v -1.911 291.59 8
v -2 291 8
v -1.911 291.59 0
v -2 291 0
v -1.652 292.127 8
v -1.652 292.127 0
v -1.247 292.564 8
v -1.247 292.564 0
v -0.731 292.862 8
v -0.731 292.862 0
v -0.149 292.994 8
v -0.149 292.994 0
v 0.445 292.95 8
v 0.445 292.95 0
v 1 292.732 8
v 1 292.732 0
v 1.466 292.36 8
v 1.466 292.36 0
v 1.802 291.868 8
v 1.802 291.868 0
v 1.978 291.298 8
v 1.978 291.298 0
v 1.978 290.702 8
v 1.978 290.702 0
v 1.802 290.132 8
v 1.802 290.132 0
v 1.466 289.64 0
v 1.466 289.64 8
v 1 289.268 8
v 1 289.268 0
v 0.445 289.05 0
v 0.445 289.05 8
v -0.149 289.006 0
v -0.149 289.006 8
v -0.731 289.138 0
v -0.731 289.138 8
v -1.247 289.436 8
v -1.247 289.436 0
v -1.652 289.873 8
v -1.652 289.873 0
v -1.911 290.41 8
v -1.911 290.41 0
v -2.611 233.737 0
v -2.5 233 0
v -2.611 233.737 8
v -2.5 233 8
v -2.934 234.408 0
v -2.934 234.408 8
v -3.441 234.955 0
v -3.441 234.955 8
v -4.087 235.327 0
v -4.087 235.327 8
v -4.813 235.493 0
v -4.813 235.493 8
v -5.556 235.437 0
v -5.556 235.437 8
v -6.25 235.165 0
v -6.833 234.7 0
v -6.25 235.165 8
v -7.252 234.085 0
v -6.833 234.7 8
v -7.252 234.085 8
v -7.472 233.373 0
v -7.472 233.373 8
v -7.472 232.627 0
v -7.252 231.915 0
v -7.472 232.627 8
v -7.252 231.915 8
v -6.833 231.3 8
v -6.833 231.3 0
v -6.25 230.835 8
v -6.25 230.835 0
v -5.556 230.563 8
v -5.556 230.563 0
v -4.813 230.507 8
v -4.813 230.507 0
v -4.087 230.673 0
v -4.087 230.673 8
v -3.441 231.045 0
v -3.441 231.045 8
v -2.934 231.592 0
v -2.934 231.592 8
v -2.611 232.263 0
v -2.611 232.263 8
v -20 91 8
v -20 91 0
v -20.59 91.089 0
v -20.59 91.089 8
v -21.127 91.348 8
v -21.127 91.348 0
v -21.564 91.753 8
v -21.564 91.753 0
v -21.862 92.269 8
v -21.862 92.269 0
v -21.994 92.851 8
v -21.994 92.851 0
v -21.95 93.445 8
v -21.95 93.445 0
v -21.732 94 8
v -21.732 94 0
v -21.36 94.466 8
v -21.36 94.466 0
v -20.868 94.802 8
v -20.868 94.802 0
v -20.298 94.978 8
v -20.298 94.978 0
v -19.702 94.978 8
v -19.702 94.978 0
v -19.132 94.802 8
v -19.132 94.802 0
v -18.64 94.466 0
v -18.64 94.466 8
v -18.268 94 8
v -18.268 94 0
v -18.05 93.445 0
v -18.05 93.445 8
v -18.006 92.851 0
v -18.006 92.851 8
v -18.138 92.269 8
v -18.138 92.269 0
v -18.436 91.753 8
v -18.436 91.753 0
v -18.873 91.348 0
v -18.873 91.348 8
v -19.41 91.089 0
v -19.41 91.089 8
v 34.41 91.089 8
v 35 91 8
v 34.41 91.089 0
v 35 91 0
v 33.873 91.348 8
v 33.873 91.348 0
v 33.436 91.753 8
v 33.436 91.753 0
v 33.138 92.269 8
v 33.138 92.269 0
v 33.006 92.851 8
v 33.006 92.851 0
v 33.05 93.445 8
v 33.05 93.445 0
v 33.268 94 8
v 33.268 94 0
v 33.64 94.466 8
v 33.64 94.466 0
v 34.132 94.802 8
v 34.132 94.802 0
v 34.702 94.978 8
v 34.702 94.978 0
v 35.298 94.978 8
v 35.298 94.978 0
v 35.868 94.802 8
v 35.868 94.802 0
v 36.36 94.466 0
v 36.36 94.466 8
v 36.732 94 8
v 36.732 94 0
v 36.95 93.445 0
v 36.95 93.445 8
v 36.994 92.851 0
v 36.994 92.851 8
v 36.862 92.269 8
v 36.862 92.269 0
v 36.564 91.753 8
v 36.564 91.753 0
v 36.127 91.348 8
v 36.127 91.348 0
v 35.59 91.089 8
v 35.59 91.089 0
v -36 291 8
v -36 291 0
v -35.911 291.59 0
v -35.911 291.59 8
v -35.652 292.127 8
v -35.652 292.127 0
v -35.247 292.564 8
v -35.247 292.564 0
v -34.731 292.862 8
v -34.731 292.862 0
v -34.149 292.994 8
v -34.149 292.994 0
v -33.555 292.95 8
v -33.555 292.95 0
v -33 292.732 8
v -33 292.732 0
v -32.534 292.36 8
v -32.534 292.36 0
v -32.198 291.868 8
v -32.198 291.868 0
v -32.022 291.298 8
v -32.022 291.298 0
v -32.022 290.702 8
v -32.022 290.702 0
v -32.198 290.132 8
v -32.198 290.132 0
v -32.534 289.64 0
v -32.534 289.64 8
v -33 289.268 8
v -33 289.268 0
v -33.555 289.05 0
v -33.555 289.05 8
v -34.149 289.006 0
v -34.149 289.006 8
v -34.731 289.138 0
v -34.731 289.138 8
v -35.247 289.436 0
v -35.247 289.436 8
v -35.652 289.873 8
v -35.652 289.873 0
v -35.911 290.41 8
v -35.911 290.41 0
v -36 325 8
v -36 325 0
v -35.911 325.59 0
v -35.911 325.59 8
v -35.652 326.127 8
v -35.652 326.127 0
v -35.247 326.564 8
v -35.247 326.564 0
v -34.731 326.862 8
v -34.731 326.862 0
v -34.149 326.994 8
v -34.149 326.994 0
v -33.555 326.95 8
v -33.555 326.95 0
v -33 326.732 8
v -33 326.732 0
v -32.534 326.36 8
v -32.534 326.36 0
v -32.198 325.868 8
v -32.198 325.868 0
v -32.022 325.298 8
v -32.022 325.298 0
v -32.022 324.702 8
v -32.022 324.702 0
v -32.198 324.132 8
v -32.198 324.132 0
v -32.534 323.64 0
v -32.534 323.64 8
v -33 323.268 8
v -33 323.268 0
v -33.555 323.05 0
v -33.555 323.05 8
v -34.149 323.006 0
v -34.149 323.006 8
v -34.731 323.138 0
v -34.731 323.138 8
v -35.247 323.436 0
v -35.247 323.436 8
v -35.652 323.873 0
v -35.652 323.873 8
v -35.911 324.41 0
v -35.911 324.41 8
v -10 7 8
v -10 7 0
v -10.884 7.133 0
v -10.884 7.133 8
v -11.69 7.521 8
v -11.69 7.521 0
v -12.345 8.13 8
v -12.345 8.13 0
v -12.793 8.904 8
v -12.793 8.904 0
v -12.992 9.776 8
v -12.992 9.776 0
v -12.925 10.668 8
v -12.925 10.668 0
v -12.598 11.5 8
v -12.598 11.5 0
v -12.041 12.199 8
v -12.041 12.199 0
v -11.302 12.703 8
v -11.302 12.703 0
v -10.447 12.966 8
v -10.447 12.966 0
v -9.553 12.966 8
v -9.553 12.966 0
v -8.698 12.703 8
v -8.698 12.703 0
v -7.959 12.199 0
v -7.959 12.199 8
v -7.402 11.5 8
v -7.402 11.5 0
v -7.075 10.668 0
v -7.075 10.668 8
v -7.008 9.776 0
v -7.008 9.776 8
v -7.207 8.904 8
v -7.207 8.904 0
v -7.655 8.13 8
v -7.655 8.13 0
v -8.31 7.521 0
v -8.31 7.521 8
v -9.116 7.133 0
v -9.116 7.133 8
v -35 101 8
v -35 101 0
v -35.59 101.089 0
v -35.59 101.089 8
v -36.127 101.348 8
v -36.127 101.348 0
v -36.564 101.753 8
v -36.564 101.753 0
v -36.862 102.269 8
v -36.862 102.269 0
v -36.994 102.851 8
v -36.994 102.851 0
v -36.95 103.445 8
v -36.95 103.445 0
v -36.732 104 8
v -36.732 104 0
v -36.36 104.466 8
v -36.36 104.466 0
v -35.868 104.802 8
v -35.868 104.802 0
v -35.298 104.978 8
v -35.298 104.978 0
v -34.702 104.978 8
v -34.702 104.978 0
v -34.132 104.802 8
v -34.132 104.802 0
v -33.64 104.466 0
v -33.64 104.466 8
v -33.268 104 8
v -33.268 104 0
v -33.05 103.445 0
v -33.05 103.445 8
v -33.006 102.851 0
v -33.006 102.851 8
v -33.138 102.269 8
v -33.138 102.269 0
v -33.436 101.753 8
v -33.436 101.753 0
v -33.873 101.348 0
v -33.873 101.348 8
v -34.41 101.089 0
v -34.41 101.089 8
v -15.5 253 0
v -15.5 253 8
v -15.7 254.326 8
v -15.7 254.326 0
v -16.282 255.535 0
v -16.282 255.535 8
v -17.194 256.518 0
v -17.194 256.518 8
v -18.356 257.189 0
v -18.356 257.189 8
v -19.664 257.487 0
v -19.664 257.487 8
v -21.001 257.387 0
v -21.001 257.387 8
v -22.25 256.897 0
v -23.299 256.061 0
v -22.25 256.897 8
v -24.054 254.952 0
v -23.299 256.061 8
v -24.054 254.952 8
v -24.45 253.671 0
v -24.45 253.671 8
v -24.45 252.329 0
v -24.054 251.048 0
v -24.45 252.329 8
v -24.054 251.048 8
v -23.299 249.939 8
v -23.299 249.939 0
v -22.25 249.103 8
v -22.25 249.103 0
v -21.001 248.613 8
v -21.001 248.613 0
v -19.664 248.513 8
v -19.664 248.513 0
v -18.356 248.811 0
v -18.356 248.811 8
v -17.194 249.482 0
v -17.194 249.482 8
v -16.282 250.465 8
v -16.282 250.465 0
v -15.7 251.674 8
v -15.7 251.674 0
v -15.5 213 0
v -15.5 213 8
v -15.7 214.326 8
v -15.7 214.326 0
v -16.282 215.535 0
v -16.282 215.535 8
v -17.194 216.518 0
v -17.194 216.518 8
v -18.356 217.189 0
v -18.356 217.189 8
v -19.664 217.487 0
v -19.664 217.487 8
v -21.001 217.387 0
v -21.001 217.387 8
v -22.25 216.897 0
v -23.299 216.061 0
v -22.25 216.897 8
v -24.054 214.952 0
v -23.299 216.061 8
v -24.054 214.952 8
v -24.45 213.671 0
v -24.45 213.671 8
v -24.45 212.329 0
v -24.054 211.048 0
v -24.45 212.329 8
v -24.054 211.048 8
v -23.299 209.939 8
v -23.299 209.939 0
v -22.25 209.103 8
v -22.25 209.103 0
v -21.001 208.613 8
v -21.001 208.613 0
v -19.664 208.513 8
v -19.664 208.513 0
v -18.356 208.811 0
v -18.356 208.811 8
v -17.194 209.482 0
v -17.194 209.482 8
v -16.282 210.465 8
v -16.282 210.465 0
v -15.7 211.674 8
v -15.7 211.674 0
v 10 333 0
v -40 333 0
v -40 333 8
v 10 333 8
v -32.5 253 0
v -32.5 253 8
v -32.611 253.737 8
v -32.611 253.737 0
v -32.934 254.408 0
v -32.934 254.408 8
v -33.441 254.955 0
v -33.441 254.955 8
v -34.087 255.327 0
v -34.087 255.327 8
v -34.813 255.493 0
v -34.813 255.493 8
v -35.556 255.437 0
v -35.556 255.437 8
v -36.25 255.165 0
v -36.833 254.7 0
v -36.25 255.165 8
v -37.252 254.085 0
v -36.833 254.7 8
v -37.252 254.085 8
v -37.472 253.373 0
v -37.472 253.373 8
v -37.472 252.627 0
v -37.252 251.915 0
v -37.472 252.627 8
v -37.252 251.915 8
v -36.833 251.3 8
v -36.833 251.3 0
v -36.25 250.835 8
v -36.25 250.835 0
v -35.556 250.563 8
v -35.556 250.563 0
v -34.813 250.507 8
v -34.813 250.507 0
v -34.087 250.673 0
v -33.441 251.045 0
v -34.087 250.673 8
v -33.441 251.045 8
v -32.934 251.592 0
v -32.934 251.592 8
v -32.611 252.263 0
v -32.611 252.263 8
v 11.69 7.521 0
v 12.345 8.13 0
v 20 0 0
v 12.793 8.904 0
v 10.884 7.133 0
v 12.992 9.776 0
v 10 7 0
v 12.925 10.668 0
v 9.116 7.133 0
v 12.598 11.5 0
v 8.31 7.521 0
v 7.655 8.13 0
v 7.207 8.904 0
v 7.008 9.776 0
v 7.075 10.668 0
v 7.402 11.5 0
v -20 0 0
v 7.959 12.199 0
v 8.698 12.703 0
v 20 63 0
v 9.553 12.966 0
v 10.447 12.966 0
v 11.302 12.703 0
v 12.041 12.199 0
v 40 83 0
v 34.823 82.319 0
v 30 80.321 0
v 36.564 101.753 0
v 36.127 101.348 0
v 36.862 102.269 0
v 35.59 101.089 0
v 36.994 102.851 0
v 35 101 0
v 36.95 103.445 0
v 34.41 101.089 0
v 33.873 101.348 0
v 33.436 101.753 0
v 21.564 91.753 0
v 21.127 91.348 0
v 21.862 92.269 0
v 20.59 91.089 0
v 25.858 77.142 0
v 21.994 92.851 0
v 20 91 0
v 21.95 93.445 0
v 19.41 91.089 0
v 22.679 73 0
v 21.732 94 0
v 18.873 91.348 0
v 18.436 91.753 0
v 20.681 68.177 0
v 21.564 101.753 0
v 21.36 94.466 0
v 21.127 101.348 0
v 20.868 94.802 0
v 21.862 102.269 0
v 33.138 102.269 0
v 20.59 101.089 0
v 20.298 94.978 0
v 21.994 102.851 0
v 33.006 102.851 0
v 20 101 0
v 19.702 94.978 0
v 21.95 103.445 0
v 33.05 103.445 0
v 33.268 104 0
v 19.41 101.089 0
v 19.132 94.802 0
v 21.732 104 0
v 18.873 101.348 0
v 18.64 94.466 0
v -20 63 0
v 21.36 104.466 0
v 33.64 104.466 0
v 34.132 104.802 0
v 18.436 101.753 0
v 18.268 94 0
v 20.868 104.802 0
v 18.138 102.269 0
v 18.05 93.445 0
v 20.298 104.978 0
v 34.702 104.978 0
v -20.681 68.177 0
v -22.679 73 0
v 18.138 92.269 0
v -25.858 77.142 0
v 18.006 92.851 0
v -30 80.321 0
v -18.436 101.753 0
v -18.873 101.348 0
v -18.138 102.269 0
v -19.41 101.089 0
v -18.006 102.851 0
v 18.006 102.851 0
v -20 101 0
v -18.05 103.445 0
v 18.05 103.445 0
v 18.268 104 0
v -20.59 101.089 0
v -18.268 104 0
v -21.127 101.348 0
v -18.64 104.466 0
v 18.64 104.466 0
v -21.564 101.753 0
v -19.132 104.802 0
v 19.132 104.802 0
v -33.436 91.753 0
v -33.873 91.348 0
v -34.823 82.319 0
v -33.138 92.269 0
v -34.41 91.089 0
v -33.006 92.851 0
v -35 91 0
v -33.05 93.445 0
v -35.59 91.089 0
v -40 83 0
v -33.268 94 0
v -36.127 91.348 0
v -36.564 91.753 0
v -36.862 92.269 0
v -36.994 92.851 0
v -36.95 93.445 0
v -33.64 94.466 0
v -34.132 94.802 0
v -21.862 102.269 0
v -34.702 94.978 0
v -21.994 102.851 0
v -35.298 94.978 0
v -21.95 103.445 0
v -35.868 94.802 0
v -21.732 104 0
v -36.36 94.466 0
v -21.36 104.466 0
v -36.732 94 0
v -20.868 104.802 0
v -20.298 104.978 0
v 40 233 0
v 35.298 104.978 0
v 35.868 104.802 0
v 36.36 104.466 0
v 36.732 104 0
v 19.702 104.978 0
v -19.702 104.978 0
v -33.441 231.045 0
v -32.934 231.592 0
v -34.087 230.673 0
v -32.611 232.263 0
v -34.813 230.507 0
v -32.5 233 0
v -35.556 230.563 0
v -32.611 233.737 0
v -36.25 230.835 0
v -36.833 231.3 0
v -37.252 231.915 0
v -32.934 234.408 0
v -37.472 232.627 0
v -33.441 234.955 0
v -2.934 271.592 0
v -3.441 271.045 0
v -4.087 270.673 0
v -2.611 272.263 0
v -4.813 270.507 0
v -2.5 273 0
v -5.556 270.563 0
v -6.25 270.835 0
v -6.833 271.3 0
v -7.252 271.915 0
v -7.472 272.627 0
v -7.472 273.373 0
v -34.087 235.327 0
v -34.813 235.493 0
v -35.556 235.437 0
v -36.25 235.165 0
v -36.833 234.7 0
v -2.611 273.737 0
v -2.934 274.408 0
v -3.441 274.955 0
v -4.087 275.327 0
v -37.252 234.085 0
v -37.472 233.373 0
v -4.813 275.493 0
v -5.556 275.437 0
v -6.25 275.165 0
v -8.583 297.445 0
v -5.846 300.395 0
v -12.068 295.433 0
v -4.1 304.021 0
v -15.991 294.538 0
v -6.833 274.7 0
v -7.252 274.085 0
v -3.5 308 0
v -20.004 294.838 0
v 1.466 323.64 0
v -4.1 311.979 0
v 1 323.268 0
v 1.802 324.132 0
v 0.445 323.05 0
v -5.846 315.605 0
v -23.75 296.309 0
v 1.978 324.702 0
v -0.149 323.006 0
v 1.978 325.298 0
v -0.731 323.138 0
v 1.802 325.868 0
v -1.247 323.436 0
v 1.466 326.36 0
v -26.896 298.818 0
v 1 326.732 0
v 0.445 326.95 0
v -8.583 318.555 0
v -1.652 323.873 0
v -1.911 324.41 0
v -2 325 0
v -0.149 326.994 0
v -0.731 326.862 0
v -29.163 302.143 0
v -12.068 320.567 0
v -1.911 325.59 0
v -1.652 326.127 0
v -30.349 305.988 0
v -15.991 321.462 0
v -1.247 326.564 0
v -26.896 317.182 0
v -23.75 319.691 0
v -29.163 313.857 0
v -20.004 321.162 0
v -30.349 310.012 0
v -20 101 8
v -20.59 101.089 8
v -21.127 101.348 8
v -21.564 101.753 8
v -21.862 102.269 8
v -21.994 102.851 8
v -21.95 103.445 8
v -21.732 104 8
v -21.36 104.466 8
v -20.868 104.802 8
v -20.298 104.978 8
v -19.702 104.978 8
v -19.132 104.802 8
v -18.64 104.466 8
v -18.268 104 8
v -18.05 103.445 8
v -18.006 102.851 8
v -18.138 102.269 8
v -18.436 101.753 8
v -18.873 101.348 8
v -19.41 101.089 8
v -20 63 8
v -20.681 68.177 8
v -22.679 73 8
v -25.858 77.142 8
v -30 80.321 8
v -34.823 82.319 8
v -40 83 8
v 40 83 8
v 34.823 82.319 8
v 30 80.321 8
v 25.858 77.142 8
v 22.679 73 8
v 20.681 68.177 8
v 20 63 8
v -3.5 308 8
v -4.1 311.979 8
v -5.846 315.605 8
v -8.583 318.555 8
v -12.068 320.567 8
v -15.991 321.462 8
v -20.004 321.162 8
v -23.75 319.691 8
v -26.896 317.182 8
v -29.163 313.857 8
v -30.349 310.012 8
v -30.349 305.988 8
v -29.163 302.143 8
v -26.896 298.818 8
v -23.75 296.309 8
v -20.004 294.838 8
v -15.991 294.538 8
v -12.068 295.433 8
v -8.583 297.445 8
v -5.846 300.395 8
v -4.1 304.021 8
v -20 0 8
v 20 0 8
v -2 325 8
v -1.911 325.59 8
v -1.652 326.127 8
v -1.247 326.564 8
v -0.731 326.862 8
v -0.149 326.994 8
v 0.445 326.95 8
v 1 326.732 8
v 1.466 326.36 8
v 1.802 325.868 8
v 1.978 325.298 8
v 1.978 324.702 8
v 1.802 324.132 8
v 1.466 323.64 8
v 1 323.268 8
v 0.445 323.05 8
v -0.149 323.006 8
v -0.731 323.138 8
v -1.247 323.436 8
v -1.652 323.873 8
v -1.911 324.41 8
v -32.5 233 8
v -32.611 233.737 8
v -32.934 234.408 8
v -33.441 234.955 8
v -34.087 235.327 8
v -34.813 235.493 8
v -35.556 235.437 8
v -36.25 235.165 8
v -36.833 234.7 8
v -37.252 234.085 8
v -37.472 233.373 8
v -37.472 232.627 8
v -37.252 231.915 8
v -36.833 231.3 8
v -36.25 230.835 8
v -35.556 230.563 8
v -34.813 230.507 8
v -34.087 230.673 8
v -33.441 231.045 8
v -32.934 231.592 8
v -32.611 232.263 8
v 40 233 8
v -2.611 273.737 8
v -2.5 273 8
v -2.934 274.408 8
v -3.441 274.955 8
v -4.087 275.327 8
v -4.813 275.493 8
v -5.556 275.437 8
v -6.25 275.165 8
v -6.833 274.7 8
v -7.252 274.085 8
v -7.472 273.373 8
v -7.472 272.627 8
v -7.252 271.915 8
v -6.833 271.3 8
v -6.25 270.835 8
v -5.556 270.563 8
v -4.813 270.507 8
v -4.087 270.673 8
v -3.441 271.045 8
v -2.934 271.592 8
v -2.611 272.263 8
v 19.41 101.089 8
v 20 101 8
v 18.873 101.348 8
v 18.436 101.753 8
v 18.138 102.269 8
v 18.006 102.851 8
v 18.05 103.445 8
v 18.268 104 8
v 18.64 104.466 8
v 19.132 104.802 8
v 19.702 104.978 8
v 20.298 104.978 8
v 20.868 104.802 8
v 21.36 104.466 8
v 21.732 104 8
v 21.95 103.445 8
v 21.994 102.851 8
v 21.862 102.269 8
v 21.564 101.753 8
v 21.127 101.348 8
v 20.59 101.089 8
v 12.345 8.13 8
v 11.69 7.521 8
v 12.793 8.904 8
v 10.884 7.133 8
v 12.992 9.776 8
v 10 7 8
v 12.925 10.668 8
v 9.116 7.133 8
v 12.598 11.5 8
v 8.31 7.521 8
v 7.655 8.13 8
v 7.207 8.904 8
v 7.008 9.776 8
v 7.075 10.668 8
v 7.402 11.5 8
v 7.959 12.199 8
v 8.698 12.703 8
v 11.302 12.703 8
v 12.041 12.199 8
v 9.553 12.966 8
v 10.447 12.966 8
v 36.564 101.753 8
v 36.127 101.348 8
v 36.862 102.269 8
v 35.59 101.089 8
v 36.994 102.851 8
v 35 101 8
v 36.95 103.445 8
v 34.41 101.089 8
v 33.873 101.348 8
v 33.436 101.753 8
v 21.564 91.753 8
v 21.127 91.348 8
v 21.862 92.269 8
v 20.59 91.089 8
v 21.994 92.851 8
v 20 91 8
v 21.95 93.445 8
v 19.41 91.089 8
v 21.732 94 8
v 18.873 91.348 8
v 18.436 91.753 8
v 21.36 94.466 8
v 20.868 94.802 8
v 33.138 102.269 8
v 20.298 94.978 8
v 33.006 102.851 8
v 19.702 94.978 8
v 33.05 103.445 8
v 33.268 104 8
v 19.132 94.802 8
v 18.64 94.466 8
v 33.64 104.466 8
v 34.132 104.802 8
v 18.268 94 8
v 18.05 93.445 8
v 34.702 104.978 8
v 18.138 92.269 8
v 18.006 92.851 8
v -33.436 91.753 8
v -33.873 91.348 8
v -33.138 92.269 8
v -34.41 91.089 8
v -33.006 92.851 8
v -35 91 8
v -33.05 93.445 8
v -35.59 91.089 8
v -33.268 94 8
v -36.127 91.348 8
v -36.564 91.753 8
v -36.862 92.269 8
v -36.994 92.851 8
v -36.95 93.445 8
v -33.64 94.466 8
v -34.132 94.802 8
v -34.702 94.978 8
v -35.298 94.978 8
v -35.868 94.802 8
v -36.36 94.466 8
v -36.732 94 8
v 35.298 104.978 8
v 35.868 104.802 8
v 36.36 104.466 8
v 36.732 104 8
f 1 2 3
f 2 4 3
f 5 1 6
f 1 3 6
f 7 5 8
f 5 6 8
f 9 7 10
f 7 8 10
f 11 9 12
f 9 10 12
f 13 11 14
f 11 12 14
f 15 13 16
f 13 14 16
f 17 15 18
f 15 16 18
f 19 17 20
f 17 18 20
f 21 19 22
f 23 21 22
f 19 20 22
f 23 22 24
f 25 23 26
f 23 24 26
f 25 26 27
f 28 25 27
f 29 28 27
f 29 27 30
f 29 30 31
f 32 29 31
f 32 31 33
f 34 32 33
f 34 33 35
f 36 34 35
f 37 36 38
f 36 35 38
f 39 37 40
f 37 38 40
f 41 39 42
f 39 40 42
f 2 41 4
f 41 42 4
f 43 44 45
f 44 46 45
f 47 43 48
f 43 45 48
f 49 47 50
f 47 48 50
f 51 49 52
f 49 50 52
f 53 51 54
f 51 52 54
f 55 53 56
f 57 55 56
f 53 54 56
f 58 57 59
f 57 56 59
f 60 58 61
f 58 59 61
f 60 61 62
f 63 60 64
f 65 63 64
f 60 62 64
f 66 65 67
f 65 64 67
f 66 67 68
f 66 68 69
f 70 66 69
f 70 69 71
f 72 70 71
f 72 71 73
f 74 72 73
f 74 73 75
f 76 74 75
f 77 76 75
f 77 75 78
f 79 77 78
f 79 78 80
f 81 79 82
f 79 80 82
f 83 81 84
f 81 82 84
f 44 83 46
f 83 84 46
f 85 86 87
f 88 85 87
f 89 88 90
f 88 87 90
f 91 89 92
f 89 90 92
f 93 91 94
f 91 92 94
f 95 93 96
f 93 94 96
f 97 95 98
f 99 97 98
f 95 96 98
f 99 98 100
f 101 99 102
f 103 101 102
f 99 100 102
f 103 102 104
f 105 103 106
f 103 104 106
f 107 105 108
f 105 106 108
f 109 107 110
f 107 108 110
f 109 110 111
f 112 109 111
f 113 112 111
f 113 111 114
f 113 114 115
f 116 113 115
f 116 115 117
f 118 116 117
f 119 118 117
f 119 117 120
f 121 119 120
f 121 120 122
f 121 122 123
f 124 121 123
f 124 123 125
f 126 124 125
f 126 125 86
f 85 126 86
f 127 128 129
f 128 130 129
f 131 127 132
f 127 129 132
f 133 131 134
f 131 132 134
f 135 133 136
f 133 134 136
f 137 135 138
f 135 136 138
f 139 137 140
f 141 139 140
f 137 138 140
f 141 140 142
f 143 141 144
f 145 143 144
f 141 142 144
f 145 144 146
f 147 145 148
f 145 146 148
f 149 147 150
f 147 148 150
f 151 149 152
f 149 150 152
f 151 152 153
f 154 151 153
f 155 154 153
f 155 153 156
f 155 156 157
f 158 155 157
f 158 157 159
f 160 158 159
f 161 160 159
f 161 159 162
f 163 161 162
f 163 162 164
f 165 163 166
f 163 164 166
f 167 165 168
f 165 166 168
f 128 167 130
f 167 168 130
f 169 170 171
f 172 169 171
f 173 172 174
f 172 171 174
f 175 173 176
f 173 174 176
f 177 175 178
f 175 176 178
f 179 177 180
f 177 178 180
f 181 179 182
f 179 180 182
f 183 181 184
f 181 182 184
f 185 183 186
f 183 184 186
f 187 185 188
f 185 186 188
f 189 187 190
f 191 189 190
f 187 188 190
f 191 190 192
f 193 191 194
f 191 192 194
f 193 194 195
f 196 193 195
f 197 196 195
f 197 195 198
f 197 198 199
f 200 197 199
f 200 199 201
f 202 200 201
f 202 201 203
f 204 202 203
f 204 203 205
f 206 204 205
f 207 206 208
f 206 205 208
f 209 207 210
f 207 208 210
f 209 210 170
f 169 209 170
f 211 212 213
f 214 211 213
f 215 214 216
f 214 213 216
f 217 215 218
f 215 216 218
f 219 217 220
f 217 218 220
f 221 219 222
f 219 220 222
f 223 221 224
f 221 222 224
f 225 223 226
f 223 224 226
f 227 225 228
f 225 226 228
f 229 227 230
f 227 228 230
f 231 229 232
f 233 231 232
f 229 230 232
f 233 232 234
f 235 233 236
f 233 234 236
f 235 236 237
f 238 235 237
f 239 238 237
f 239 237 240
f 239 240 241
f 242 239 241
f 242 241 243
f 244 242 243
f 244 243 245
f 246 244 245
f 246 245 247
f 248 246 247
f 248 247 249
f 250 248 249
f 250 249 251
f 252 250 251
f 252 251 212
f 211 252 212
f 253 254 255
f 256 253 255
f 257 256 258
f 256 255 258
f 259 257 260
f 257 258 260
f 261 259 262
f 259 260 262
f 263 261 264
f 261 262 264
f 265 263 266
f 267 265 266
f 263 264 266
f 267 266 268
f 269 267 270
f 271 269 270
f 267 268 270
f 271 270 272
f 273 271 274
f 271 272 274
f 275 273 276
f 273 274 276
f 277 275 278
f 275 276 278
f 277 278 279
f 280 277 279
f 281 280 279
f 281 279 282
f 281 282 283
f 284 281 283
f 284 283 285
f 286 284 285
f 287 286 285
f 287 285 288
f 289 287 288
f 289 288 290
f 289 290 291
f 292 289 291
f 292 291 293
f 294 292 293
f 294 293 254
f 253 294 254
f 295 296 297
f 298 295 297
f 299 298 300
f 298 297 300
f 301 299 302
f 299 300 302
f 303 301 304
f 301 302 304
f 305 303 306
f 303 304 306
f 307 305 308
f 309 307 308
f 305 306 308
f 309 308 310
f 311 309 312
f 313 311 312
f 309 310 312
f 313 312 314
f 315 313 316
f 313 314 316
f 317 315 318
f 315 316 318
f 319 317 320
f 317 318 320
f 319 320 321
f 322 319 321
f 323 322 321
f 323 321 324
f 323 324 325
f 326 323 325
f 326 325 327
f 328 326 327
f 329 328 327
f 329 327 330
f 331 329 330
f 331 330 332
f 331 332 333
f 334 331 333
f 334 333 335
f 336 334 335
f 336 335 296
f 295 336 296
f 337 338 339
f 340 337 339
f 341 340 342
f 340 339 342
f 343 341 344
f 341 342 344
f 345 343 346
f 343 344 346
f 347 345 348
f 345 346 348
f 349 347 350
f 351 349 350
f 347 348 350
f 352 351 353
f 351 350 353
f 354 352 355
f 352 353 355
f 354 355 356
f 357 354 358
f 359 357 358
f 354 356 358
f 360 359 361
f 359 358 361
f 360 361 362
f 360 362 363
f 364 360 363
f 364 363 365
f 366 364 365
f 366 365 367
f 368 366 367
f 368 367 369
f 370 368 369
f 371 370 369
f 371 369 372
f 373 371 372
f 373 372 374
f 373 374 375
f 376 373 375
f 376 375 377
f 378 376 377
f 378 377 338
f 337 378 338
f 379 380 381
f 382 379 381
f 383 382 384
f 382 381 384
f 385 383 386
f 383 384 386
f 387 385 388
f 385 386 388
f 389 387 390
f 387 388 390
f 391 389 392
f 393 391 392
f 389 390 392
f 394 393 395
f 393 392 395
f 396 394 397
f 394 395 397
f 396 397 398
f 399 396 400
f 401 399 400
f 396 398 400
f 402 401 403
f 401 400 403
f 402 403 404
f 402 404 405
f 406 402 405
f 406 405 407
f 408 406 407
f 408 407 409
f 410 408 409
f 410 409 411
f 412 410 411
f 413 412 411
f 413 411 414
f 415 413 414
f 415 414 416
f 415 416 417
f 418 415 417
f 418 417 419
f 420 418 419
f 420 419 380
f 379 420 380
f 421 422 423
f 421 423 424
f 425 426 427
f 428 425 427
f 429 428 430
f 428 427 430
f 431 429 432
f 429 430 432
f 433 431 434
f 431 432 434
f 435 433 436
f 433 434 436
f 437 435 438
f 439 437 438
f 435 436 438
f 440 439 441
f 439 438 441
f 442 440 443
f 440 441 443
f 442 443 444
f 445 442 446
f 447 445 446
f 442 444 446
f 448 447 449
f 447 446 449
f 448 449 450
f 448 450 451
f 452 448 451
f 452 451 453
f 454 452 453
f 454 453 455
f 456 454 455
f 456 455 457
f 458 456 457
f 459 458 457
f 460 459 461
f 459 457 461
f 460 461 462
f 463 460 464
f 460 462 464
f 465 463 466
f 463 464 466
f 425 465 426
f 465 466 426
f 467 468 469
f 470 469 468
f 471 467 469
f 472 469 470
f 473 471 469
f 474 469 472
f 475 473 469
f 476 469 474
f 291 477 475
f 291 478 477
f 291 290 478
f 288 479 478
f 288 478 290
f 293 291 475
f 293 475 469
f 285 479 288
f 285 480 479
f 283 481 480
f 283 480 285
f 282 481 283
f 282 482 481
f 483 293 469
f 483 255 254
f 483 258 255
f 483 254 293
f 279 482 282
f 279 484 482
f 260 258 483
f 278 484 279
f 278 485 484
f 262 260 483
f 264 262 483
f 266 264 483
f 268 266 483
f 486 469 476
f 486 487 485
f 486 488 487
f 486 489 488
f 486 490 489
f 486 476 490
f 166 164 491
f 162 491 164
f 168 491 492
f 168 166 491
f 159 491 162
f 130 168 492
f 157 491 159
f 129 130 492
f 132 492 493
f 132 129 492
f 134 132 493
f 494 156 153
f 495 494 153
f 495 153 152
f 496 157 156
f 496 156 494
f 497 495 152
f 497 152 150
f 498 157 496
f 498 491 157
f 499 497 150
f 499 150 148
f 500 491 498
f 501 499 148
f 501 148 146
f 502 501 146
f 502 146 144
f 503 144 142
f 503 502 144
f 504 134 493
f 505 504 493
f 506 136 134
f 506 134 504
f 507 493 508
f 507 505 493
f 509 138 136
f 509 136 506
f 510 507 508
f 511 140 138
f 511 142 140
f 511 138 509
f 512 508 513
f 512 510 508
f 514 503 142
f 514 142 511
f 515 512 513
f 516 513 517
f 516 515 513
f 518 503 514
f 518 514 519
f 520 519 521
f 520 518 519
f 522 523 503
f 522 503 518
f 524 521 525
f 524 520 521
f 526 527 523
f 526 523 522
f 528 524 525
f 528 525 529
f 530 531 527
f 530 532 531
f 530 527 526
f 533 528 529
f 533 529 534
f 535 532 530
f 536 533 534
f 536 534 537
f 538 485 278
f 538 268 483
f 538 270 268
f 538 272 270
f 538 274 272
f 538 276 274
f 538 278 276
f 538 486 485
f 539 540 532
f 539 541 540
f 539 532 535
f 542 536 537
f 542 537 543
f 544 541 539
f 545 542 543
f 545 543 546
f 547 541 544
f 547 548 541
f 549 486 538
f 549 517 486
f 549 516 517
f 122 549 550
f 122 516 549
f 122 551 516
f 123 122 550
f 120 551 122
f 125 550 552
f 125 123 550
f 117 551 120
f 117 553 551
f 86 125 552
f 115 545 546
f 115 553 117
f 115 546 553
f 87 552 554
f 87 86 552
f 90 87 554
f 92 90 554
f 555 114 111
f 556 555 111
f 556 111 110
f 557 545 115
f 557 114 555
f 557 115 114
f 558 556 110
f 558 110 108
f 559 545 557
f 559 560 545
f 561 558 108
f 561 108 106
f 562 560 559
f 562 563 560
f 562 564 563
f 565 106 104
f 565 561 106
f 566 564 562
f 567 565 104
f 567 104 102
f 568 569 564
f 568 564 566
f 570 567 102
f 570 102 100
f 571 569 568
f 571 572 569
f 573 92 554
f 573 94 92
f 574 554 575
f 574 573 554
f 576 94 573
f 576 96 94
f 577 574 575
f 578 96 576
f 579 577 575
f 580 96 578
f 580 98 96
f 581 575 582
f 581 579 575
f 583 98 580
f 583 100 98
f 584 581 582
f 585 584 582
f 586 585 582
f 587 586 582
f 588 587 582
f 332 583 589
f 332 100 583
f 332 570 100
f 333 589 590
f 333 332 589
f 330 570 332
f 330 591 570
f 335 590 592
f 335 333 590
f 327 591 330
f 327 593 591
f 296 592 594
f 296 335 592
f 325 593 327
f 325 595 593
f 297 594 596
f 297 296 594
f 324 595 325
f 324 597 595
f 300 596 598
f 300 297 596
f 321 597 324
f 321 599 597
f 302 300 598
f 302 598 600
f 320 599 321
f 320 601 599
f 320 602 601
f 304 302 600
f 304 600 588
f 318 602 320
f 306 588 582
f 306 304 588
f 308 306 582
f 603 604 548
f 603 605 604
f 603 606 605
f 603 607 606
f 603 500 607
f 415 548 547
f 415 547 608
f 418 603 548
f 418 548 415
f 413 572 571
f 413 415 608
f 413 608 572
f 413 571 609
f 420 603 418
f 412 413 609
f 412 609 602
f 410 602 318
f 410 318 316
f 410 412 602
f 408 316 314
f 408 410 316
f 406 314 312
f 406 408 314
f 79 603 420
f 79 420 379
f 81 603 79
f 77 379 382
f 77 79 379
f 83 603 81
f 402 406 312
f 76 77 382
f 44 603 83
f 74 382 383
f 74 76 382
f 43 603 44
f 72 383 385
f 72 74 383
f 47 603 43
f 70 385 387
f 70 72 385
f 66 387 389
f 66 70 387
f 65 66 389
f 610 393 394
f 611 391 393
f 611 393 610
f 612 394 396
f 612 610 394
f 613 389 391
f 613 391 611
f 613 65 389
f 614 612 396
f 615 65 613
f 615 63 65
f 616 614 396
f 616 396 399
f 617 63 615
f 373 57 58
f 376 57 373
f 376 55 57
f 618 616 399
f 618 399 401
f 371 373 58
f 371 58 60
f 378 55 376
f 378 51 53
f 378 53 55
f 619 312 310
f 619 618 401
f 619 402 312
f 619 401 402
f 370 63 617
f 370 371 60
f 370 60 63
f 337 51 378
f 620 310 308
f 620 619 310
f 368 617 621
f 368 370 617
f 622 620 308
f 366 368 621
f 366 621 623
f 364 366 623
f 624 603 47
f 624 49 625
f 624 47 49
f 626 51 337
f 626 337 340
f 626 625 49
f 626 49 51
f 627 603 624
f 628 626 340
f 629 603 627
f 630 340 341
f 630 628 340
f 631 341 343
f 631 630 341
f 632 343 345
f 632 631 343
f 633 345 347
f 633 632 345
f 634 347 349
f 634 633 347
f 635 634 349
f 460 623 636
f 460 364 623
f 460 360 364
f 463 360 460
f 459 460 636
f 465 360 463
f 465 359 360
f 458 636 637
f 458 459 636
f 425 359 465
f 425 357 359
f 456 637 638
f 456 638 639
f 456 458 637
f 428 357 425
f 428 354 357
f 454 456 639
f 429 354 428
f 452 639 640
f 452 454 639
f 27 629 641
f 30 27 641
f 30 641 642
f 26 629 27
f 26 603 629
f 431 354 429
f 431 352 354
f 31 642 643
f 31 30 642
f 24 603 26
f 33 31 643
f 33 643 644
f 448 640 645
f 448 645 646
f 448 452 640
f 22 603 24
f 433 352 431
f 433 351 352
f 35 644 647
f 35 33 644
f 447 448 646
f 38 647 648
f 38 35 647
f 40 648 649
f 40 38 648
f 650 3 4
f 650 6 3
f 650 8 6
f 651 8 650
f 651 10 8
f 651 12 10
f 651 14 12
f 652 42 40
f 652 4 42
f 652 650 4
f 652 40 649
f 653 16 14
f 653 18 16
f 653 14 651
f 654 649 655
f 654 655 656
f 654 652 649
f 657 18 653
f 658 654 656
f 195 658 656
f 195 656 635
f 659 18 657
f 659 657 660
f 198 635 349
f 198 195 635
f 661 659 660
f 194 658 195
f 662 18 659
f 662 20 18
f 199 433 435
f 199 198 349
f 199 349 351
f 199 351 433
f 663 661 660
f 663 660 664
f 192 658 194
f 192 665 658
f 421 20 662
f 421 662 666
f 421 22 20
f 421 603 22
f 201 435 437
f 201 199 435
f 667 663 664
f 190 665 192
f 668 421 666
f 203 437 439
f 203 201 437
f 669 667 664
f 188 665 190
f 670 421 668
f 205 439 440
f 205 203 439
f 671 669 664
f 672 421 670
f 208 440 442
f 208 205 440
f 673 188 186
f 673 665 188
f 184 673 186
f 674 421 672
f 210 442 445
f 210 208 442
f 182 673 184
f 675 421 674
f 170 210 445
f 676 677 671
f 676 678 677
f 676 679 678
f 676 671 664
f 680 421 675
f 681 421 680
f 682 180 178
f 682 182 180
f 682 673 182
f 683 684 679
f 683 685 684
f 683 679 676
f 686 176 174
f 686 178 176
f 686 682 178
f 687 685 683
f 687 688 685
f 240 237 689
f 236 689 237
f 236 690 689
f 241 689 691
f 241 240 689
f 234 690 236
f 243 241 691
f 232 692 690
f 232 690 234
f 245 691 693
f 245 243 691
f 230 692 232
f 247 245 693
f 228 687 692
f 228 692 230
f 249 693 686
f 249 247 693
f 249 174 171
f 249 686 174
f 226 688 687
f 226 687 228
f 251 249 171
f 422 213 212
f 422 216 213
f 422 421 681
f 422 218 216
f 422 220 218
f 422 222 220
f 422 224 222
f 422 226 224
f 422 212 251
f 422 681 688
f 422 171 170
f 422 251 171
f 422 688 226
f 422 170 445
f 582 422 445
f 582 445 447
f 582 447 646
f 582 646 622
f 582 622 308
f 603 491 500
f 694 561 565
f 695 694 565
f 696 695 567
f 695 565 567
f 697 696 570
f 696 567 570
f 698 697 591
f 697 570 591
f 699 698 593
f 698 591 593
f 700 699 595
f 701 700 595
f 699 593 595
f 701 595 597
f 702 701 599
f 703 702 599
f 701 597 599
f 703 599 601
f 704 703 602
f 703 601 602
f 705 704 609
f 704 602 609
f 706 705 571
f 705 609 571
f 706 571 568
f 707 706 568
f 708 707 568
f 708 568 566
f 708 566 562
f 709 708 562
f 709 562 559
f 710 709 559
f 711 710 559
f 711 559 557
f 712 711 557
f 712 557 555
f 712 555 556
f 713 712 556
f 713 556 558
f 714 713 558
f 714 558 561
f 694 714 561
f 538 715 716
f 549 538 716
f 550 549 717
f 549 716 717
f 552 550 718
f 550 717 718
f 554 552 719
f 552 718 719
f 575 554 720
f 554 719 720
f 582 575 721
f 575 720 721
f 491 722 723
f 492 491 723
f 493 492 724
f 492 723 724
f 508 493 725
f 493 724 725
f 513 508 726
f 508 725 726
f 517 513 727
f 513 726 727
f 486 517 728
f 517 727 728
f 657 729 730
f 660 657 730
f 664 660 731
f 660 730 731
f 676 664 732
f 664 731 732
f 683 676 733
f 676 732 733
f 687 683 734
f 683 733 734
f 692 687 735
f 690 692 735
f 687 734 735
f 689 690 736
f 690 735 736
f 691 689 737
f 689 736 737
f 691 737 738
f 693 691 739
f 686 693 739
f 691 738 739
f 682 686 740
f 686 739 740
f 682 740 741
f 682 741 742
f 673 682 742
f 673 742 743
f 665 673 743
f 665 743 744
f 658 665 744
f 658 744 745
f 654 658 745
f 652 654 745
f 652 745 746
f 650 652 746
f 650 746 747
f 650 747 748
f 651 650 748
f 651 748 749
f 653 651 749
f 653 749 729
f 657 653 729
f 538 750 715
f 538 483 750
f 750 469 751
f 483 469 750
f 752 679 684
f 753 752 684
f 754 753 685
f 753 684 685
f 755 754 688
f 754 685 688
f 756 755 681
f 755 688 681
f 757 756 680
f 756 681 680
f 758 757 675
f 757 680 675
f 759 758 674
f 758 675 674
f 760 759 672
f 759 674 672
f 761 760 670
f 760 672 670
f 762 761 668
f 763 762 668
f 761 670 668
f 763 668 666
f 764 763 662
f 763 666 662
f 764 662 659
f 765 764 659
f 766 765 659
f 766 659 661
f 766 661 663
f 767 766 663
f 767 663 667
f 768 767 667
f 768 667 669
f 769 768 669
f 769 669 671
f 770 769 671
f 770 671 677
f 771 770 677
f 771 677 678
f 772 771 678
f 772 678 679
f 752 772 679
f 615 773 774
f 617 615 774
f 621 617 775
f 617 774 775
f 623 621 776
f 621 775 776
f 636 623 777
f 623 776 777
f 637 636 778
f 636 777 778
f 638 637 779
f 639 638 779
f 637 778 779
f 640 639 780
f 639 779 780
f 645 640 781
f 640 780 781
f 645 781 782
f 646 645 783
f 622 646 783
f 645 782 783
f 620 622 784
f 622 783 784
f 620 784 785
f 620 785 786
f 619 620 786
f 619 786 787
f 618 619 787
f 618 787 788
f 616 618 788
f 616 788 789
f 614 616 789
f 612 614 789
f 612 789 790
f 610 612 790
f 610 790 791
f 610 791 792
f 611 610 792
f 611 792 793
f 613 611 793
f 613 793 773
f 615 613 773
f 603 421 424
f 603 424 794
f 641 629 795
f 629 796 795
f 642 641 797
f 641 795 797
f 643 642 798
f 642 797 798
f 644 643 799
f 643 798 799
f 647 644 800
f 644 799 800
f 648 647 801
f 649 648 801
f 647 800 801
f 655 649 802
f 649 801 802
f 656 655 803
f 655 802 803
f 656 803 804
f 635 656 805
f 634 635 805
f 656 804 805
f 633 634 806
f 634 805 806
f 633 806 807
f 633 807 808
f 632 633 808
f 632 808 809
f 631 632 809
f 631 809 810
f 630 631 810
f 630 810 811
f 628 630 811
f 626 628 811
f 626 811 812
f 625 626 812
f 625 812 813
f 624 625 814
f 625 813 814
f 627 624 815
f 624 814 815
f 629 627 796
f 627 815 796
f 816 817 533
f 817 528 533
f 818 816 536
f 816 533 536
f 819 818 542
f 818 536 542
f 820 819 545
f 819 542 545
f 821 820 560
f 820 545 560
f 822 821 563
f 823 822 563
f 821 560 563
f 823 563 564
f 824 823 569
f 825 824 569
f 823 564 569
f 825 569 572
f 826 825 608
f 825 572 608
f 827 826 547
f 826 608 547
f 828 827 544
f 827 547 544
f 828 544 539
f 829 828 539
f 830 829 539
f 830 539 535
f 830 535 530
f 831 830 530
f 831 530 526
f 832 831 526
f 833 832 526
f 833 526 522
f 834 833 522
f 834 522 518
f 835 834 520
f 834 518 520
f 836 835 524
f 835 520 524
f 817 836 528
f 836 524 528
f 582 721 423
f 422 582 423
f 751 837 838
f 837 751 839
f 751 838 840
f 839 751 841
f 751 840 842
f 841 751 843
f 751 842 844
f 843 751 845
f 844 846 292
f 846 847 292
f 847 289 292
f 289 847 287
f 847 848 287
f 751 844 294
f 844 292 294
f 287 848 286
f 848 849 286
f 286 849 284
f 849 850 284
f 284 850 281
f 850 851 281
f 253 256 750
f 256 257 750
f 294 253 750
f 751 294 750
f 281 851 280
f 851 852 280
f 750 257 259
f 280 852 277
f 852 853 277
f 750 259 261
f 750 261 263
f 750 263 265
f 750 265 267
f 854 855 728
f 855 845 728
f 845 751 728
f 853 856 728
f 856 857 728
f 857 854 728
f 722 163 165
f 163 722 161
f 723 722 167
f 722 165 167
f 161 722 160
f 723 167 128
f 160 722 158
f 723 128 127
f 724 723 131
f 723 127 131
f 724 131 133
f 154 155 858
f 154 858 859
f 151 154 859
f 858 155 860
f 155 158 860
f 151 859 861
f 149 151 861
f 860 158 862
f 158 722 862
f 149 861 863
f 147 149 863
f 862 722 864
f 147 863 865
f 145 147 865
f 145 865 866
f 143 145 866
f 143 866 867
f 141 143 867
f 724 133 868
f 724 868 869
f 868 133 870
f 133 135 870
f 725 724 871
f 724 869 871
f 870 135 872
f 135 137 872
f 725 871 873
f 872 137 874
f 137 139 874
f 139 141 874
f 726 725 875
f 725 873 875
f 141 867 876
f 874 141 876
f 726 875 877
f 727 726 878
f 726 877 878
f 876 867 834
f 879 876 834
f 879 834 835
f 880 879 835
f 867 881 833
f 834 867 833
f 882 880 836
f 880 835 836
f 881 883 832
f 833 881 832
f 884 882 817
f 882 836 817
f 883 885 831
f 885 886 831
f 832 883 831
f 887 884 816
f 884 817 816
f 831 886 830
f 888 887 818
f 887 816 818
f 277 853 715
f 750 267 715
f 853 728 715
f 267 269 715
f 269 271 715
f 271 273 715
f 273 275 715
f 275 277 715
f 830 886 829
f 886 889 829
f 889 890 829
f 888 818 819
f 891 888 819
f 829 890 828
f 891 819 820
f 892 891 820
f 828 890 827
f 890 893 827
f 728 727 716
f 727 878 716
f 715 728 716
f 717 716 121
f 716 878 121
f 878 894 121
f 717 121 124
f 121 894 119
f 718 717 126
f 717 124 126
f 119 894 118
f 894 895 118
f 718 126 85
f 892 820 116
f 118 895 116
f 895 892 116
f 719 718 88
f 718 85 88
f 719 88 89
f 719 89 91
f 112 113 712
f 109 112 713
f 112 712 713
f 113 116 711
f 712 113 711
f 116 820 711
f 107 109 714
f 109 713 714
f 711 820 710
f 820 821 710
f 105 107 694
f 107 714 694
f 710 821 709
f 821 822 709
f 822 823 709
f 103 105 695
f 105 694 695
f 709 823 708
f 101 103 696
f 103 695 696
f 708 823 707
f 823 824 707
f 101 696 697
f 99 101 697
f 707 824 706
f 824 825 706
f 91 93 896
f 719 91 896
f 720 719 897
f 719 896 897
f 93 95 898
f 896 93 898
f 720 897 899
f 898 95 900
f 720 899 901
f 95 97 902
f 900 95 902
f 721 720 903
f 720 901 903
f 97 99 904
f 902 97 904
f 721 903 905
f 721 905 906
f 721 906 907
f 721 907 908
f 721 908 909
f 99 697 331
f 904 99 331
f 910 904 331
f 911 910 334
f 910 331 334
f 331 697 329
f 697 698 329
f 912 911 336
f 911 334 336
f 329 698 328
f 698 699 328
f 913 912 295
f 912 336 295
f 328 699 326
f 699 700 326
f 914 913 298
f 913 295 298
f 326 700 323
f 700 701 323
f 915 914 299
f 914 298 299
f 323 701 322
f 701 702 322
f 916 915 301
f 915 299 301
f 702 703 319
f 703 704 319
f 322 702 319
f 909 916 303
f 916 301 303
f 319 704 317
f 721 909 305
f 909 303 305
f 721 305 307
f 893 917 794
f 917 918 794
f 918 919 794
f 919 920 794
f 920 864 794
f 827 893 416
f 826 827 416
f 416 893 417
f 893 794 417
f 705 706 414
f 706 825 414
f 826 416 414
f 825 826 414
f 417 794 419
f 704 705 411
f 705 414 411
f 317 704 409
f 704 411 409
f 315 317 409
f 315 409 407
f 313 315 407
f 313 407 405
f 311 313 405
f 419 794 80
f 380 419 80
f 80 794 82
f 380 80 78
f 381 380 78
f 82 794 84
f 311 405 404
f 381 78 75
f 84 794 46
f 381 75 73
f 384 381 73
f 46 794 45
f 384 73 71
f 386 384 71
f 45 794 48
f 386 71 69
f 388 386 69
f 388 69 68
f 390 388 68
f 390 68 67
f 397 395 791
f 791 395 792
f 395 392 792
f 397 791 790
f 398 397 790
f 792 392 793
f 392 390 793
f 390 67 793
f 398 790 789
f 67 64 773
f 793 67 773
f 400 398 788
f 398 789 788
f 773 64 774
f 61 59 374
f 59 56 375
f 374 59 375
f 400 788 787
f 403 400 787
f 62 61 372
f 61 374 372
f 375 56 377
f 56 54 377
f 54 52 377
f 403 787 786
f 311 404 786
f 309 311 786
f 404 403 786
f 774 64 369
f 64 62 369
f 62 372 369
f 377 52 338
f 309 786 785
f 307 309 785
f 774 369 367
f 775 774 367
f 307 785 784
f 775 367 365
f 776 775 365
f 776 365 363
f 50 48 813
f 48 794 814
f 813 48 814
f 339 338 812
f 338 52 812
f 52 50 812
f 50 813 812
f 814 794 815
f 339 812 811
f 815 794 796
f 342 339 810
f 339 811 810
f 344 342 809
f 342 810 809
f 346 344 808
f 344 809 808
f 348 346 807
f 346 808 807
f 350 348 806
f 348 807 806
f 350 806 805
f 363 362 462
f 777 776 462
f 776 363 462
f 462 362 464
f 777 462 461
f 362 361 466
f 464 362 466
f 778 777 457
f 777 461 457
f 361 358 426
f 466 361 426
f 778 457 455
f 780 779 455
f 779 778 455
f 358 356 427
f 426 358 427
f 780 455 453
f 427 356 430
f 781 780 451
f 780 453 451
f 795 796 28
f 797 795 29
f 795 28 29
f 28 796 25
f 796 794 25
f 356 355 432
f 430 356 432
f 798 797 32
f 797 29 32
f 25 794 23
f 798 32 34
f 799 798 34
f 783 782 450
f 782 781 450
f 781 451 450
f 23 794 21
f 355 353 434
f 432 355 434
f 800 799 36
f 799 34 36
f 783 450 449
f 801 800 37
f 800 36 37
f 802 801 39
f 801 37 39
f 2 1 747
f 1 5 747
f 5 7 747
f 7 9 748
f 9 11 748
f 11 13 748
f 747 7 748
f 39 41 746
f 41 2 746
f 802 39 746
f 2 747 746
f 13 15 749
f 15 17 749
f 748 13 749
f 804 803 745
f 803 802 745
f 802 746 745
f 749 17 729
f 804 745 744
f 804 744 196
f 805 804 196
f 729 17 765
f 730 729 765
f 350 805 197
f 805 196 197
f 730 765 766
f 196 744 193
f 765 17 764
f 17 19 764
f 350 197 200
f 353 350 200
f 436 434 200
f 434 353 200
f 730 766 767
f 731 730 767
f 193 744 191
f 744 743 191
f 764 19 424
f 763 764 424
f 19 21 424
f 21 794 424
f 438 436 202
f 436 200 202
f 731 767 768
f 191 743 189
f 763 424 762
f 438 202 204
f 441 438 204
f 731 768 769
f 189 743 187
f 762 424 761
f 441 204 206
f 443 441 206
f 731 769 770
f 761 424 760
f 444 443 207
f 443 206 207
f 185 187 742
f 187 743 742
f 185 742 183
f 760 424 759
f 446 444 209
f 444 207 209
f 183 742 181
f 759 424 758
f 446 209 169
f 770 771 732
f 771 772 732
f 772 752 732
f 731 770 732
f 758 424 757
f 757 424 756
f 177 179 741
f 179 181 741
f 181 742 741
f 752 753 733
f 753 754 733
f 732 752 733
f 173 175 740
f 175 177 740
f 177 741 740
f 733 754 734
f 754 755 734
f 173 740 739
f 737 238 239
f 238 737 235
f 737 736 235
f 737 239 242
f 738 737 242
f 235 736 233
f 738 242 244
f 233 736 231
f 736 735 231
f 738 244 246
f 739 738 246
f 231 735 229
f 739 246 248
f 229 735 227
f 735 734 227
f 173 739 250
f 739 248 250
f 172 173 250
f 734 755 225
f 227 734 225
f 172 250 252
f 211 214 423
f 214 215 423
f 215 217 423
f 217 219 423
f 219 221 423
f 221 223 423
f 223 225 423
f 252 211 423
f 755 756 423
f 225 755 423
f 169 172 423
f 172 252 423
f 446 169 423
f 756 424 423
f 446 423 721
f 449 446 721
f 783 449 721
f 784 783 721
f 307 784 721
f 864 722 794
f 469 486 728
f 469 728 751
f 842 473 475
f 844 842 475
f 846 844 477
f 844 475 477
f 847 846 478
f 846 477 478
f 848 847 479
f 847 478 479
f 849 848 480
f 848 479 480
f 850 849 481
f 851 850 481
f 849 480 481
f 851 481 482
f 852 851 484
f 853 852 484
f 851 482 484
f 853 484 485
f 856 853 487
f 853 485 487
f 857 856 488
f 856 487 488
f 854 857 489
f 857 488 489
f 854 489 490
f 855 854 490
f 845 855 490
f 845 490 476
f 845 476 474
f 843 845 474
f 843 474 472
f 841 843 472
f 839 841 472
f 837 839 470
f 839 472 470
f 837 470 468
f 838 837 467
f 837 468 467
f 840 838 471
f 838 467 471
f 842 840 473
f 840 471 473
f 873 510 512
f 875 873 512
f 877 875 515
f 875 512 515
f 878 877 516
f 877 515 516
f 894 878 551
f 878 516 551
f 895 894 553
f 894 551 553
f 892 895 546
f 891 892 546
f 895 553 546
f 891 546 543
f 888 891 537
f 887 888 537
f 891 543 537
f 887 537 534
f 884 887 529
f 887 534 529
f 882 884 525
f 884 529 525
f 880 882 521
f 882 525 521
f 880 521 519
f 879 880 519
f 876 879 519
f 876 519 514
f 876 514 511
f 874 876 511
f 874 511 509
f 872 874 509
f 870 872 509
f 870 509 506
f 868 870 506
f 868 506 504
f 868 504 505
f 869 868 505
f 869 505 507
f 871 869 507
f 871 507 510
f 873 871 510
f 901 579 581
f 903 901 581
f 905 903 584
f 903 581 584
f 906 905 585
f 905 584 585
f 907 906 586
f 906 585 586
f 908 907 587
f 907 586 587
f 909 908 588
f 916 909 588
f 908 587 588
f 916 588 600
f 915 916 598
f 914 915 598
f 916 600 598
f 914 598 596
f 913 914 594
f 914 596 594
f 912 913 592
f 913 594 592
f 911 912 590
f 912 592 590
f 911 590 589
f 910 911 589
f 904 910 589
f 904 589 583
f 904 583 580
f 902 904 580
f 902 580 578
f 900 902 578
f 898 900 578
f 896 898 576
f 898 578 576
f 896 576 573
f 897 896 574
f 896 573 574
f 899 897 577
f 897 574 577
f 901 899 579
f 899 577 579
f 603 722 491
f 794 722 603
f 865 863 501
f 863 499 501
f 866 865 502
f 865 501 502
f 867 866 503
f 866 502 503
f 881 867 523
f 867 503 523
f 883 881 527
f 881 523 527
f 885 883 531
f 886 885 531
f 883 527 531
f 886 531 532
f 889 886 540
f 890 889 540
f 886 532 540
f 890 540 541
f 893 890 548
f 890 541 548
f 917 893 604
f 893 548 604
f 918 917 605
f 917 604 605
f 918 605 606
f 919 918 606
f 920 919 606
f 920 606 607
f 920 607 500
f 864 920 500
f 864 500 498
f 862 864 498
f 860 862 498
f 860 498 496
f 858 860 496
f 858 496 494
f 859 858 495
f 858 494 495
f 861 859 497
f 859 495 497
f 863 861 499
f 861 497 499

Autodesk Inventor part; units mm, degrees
ref_plane "YZ Plane" through (0, 0, 0) normal (1, 0, 0) x (0, 1, 0)
ref_plane "XZ Plane" through (0, 0, 0) normal (0, 1, 0) x (-1, 0, 0)
ref_plane "XY Plane" through (0, 0, 0) normal (0, 0, 1) x (1, 0, 0)
sketch "Szkic1" plane through (0, 0, 0) normal (0, 0, 1) x (1, 0, 0)
  line L0 (0, 0) -> (20, 0)
  line L1 (0, 0) -> (-20, 0)
  line L2 (-20, 0) -> (-20, 20)
  line L3 (-20, 0) -> (0, 0) construction
  line L4 (-20, 20) -> (20, 20)
  line L5 (20, 20) -> (20, 0)
  line L6 (-20, 0) -> (-20, 88)
  line L7 (-20, 88) -> (20, 88)
  line L8 (20, 88) -> (20, 20)
  line L9 (20, 88) -> (20, 93)
  line L10 (20, 93) -> (-20, 93)
  line L11 (-20, 93) -> (-20, 88)
  line L12 (0, 93) -> (35, 93)
  line L13 (35, 93) -> (40, 93)
  line L14 (0, 93) -> (-35, 93)
  line L15 (-35, 93) -> (-40, 93)
  line L16 (-40, 93) -> (-40, 103)
  line L17 (-40, 103) -> (40, 103)
  line L18 (40, 103) -> (40, 93)
  line L19 (-35, 93) -> (-35, 103)
  line L20 (35, 93) -> (35, 103)
  circle A0 centre (-35, 103) radius 1.5
  circle A1 centre (-35, 93) radius 1.5
  circle A2 centre (35, 103) radius 1.5
  circle A3 centre (35, 93) radius 1.5
  line L21 (40, 93) -> (40, 83)
  line L22 (40, 83) -> (20, 83)
  line L23 (-40, 93) -> (-40, 83)
  line L24 (-40, 83) -> (-20, 83)
  line L25 (-40, 103) -> (-40, 183)
  line L26 (40, 103) -> (40, 183)
  line L27 (40, 183) -> (-40, 183)
  dimension "d0" = 20
  dimension "d1" = 20
  dimension "d2" = 20
  dimension "d3" = 90
  dimension "d4" = 88
  dimension "d5" = 5
  dimension "d6" = 35
  dimension "d7" = 5
  dimension "d8" = 35
  dimension "d9" = 5
  dimension "d10" = 10
  dimension "d11" = 3
  dimension "d12" = 3
  dimension "d13" = 3
  dimension "d14" = 3
  dimension "d15" = 10
  dimension "d16" = 10
  dimension "d17" = 80
  dimension "d18" = 80
extrude "Wyciągnięcie proste1" add sketch "Szkic1" along normal blind 8
sketch "Szkic2" plane through (0, 0, 8) normal (0, 0, 1) x (1, 0, 0)
  circle A0 centre (-35, 103) radius 1.5 projected
  circle A1 centre (-35, 93) radius 1.5 projected
  circle A2 centre (35, 103) radius 1.5 projected
  circle A3 centre (35, 93) radius 1.5 projected
  line L0 (-35, 103) -> (35, 103)
  line L1 (-35, 93) -> (35, 93)
  line L2 (-35, 103) -> (-20, 103)
  line L3 (-20, 103) -> (-20, 93)
  line L4 (35, 103) -> (20, 103)
  line L5 (20, 103) -> (20, 93)
  circle A4 centre (-20, 103) radius 2
  circle A5 centre (-20, 93) radius 2
  circle A6 centre (20, 103) radius 2
  circle A7 centre (20, 93) radius 2
  line L6 (40, 83) -> (40, 183) projected
  line L7 (40, 183) -> (-40, 183) projected
  line L8 (-40, 183) -> (-40, 83) projected
  line L9 (-40, 83) -> (-20, 83) projected
  line L10 (-20, 83) -> (-20, 0) projected
  line L11 (-20, 0) -> (20, 0) projected
  line L12 (20, 0) -> (20, 83) projected
  line L13 (20, 83) -> (40, 83) projected
  line L14 (-20, 0) -> (20, 0) projected
  line L15 (-20, 0) -> (-20, 10)
  line L16 (-20, 83) -> (-20, 0) projected
  line L17 (-20, 10) -> (20, 10)
  line L18 (-20, 10) -> (-10, 10)
  line L19 (20, 10) -> (10, 10)
  circle A8 centre (-10, 10) radius 3
  circle A9 centre (10, 10) radius 3
  point P0 (0, 0)
  dimension "d21" = 15
  dimension "d22" = 15
  dimension "d23" = 4
  dimension "d24" = 4
  dimension "d25" = 4
  dimension "d26" = 4
  dimension "d27" = 10
  dimension "d28" = 10
  dimension "d29" = 10
  dimension "d30" = 6
  dimension "d31" = 6
hole "Otwór1" at (-20, 103, 8) at (-20, 93, 8) at (20, 103, 8) at (20, 93, 8) at (-35, 103, 8) at (-35, 93, 8) at (35, 103, 8) at (35, 93, 8) direction (0, 0, -1) diameter 4 end through all
sketch "Szkic3" plane through (0, 0, 8) normal (0, 0, 1) x (1, 0, 0)
  circle A0 centre (-10, 10) radius 3 projected
  circle A1 centre (10, 10) radius 3 projected
  point P0 (0, 0)
hole "Otwór2" at (-10, 10, 8) at (10, 10, 8) direction (0, 0, -1) diameter 6 end through all
fillet "Zaokrąglenie1" radius 20 2 edges at (20, 83, 4) (-20, 83, 4)
sketch "Szkic4" plane through (0, 0, 8) normal (0, 0, 1) x (1, 0, 0)
  line L0 (40, 183) -> (-40, 183) projected
  line L1 (40, 83) -> (40, 183) projected
  line L2 (40, 183) -> (-40, 183)
  line L3 (-40, 183) -> (-40, 333)
  line L4 (-40, 333) -> (0, 333)
  line L5 (40, 183) -> (40, 233)
  line L6 (40, 233) -> (0, 333)
  point P0 (0, 0)
  dimension "d47" = 150
  dimension "d50" = 50
extrude "Wyciągnięcie proste2" add sketch "Szkic4" against normal up to surface (8 mm away)
sketch "Szkic5" plane through (0, 0, 8) normal (0, 0, 1) x (1, 0, 0)
  line L0 (0, 333) -> (-40, 333) projected
  line L1 (-40, 333) -> (-40, 83) projected
  line L2 (-40, 333) -> (-40, 308)
  line L3 (-40, 308) -> (-17, 308)
  circle A0 centre (-17, 308) radius 13.5
  point P0 (0, 0)
  dimension "d51" = 25
  dimension "d52" = 23
  dimension "d53" = 27
extrude "Wyciągnięcie proste4" cut sketch "Szkic5" against normal up to next
sketch "Szkic7" plane through (0, 0, 0) normal (0, 0, -1) x (-1, 0, 0)
  line L0 (0, 333) -> (-40, 233) projected
  line L1 (0, 333) -> (40, 333) projected
  line L2 (0, 333) -> (-10, 333)
  line L3 (-10, 333) -> (-40, 233)
  point P0 (0, 0)
  dimension "d59" = 10
extrude "Wyciągnięcie proste5" add sketch "Szkic7" against normal blind 8
sketch "Szkic9" plane through (0, 0, 0) normal (0, 0, -1) x (-1, 0, 0)
  circle A0 centre (17, 308) radius 15
  line L0 (42, 333) -> (-8, 333)
  line L1 (-8, 333) -> (-23, 283)
  line L2 (-23, 283) -> (42, 283)
  line L3 (42, 283) -> (42, 333)
  line L4 (-10, 333) -> (40, 333) projected
  line L5 (40, 83) -> (40, 333) projected
  circle A1 centre (0, 325) radius 2
  circle A2 centre (34, 325) radius 2
  circle A3 centre (0, 291) radius 2
  circle A4 centre (34, 291) radius 2
  circle A5 centre (17, 308) radius 13.5 projected
  point P0 (0, 0)
  point P1 (42, 283)
  dimension "d62" = 4
  dimension "d63" = 4
  dimension "d64" = 4
  dimension "d65" = 4
extrude "Wyciągnięcie proste6" cut sketch "Szkic9" against normal up to next contours A1 | A2 | A3 | A4
thread "Gwint1" size "M4x0.7" class "6H" standard "ANSI Metric M Profile" full length
thread "Gwint2" size "M4x0.7" class "6H" standard "ANSI Metric M Profile" full length
thread "Gwint3" size "M4x0.7" class "6H" standard "ANSI Metric M Profile" full length
thread "Gwint4" size "M4x0.7" class "6H" standard "ANSI Metric M Profile" full length
sketch "Szkic11" plane through (0, 0, 8) normal (0, 0, 1) x (1, 0, 0)
  line L0 (-40, 333) -> (-40, 83) projected
  line L1 (10, 333) -> (-40, 333) projected
  line L2 (-40, 333) -> (-40, 243)
  line L3 (-40, 83) -> (-40, 333) projected
  line L4 (-40, 333) -> (50, 333) construction
  line L5 (-40, 243) -> (0, 243)
  line L6 (0, 243) -> (0, 163)
  line L7 (0, 163) -> (-40, 163)
  line L8 (-40, 243) -> (-20, 243)
  line L9 (-20, 243) -> (-20, 163)
  line L10 (-20, 163) -> (-20, 203)
  line L11 (-20, 243) -> (-20, 223)
  line L12 (-20, 203) -> (-20, 213)
  line L13 (-20, 243) -> (-20, 253)
  circle A0 centre (-20, 213) radius 4.5
  circle A1 centre (-20, 253) radius 4.5
  point P0 (0, 0)
  dimension "d76" = 90
  dimension "d77" = 90
  dimension "d78" = 40
  dimension "d79" = 80
  dimension "d80" = 20
  dimension "d81" = 40
  dimension "d82" = 20
  dimension "d113" = 10
  dimension "d114" = 10
  dimension "d115" = 9
  dimension "d116" = 9
extrude "Wyciągnięcie proste7" cut sketch "Szkic11" against normal up to next contours A1 | A0 L9 | L9 A0
sketch "Szkic12" plane through (0, 0, 8) normal (0, 0, 1) x (1, 0, 0)
  line L0 (40, 233) -> (10, 333)
  line L1 (10, 333) -> (-40, 333)
  line L2 (-40, 333) -> (-40, 83)
  line L3 (40, 83) -> (40, 233)
  arc A0 (-20, 63) -> (-40, 83) centre (-40, 63) ccw
  arc A1 (40, 83) -> (20, 63) centre (40, 63) ccw
  line L4 (-40, 283) -> (20, 283)
  line L5 (20, 283) -> (20, 223)
  line L6 (-40, 223) -> (20, 223)
  line L7 (-40, 223) -> (-40, 283)
  circle A2 centre (0, 291) radius 2 projected
  circle A3 centre (0, 325) radius 2 projected
  circle A4 centre (-34, 325) radius 2 projected
  circle A5 centre (-34, 291) radius 2 projected
  circle A6 centre (-17, 308) radius 13.5 projected
  circle A7 centre (-10, 10) radius 3 projected
  circle A8 centre (10, 10) radius 3 projected
  circle A9 centre (35, 103) radius 2 projected
  circle A10 centre (-35, 103) radius 2 projected
  circle A11 centre (20, 103) radius 2 projected
  circle A12 centre (-20, 103) radius 2 projected
  circle A13 centre (-20, 93) radius 2 projected
  circle A14 centre (20, 93) radius 2 projected
  circle A15 centre (-35, 93) radius 2 projected
  circle A16 centre (35, 93) radius 2 projected
  line L8 (-20, 63) -> (-20, 0) projected
  line L9 (-20, 0) -> (20, 0) projected
  line L10 (20, 0) -> (20, 63) projected
  arc A17 (40, 83) -> (20, 63) centre (40, 63) ccw projected
  line L11 (40, 83) -> (40, 233) projected
  line L12 (40, 233) -> (10, 333) projected
  line L13 (10, 333) -> (-40, 333) projected
  line L14 (-40, 333) -> (-40, 83) projected
  arc A18 (-20, 63) -> (-40, 83) centre (-40, 63) ccw projected
  line L15 (-35, 258) -> (-35, 253)
  line L16 (-5, 278) -> (-5, 273)
  line L17 (-35, 228) -> (-35, 233)
  line L18 (-5, 228) -> (-5, 233)
  circle A19 centre (-35, 233) radius 2.5
  circle A20 centre (-5, 233) radius 2.5
  circle A21 centre (-5, 273) radius 2.5
  circle A22 centre (-35, 253) radius 2.5
  line L19 (-37.5, 248) -> (-37.5, 258)
  arc A23 (-32.5, 258) -> (-37.5, 258) centre (-35, 258) ccw
  line L20 (-32.5, 258) -> (-32.5, 248)
  arc A24 (-37.5, 248) -> (-32.5, 248) centre (-35, 248) ccw
  line L21 (-2.5, 238) -> (-2.5, 228)
  arc A25 (-7.5, 228) -> (-2.5, 228) centre (-5, 228) ccw
  line L22 (-7.5, 228) -> (-7.5, 238)
  arc A26 (-2.5, 238) -> (-7.5, 238) centre (-5, 238) ccw
  line L23 (-37.5, 228) -> (-37.5, 238)
  arc A27 (-32.5, 238) -> (-37.5, 238) centre (-35, 238) ccw
  line L24 (-32.5, 238) -> (-32.5, 228)
  arc A28 (-37.5, 228) -> (-32.5, 228) centre (-35, 228) ccw
  line L25 (-2.5, 278) -> (-2.5, 268)
  arc A29 (-7.5, 268) -> (-2.5, 268) centre (-5, 268) ccw
  line L26 (-7.5, 268) -> (-7.5, 278)
  arc A30 (-2.5, 278) -> (-7.5, 278) centre (-5, 278) ccw
  line L27 (-30, 248) -> (-30, 258)
  arc A31 (-10, 258) -> (-30, 258) centre (-20, 258) ccw
  line L28 (-10, 258) -> (-10, 248)
  arc A32 (-30, 248) -> (-10, 248) centre (-20, 248) ccw
  line L29 (-40, 223) -> (-40, 283)
  line L30 (-40, 223) -> (20, 223)
  line L31 (20, 283) -> (20, 223)
  line L32 (-40, 283) -> (20, 283)
  line L33 (-35, 278) -> (-35, 283)
  line L34 (-5, 278) -> (-5, 283)
  line L35 (-35, 228) -> (-35, 223)
  line L36 (-5, 228) -> (-5, 223)
  line L37 (10, 333) -> (-40, 333) projected
  line L38 (-40, 333) -> (-40, 283)
  line L39 (-40, 83) -> (-40, 333) projected
  point P0 (0, 0)
  point P1 (30, 43)
  point P2 (-35, 248)
  point P3 (-5, 268)
  point P4 (-5, 238)
  point P5 (-35, 238)
  dimension "d87" = 5
  dimension "d88" = 5
  dimension "d89" = 5
  dimension "d90" = 5
  dimension "d91" = 5
  dimension "d92" = 5
  dimension "d93" = 5
  dimension "d94" = 5
  dimension "d118" = 50
extrude "Wyciągnięcie proste8" cut sketch "Szkic12" against normal up to next contours A19 | A21 | A20 | A22
thread "Gwint9" size "M4x0.7" class "6H" standard "ANSI Metric M Profile" full length
thread "Gwint10" size "M4x0.7" class "6H" standard "ANSI Metric M Profile" full length
thread "Gwint11" size "M4x0.7" class "6H" standard "ANSI Metric M Profile" full length
thread "Gwint12" size "M4x0.7" class "6H" standard "ANSI Metric M Profile" full length
thread "Gwint13" size "M5x0.8" class "6H" standard "ANSI Metric M Profile" full length
thread "Gwint14" size "M5x0.8" class "6H" standard "ANSI Metric M Profile" full length
thread "Gwint15" size "M5x0.8" class "6H" standard "ANSI Metric M Profile" full length
thread "Gwint16" size "M5x0.8" class "6H" standard "ANSI Metric M Profile" full length
properties part number "Wspornik pionowy osi Y - prawa strona"
